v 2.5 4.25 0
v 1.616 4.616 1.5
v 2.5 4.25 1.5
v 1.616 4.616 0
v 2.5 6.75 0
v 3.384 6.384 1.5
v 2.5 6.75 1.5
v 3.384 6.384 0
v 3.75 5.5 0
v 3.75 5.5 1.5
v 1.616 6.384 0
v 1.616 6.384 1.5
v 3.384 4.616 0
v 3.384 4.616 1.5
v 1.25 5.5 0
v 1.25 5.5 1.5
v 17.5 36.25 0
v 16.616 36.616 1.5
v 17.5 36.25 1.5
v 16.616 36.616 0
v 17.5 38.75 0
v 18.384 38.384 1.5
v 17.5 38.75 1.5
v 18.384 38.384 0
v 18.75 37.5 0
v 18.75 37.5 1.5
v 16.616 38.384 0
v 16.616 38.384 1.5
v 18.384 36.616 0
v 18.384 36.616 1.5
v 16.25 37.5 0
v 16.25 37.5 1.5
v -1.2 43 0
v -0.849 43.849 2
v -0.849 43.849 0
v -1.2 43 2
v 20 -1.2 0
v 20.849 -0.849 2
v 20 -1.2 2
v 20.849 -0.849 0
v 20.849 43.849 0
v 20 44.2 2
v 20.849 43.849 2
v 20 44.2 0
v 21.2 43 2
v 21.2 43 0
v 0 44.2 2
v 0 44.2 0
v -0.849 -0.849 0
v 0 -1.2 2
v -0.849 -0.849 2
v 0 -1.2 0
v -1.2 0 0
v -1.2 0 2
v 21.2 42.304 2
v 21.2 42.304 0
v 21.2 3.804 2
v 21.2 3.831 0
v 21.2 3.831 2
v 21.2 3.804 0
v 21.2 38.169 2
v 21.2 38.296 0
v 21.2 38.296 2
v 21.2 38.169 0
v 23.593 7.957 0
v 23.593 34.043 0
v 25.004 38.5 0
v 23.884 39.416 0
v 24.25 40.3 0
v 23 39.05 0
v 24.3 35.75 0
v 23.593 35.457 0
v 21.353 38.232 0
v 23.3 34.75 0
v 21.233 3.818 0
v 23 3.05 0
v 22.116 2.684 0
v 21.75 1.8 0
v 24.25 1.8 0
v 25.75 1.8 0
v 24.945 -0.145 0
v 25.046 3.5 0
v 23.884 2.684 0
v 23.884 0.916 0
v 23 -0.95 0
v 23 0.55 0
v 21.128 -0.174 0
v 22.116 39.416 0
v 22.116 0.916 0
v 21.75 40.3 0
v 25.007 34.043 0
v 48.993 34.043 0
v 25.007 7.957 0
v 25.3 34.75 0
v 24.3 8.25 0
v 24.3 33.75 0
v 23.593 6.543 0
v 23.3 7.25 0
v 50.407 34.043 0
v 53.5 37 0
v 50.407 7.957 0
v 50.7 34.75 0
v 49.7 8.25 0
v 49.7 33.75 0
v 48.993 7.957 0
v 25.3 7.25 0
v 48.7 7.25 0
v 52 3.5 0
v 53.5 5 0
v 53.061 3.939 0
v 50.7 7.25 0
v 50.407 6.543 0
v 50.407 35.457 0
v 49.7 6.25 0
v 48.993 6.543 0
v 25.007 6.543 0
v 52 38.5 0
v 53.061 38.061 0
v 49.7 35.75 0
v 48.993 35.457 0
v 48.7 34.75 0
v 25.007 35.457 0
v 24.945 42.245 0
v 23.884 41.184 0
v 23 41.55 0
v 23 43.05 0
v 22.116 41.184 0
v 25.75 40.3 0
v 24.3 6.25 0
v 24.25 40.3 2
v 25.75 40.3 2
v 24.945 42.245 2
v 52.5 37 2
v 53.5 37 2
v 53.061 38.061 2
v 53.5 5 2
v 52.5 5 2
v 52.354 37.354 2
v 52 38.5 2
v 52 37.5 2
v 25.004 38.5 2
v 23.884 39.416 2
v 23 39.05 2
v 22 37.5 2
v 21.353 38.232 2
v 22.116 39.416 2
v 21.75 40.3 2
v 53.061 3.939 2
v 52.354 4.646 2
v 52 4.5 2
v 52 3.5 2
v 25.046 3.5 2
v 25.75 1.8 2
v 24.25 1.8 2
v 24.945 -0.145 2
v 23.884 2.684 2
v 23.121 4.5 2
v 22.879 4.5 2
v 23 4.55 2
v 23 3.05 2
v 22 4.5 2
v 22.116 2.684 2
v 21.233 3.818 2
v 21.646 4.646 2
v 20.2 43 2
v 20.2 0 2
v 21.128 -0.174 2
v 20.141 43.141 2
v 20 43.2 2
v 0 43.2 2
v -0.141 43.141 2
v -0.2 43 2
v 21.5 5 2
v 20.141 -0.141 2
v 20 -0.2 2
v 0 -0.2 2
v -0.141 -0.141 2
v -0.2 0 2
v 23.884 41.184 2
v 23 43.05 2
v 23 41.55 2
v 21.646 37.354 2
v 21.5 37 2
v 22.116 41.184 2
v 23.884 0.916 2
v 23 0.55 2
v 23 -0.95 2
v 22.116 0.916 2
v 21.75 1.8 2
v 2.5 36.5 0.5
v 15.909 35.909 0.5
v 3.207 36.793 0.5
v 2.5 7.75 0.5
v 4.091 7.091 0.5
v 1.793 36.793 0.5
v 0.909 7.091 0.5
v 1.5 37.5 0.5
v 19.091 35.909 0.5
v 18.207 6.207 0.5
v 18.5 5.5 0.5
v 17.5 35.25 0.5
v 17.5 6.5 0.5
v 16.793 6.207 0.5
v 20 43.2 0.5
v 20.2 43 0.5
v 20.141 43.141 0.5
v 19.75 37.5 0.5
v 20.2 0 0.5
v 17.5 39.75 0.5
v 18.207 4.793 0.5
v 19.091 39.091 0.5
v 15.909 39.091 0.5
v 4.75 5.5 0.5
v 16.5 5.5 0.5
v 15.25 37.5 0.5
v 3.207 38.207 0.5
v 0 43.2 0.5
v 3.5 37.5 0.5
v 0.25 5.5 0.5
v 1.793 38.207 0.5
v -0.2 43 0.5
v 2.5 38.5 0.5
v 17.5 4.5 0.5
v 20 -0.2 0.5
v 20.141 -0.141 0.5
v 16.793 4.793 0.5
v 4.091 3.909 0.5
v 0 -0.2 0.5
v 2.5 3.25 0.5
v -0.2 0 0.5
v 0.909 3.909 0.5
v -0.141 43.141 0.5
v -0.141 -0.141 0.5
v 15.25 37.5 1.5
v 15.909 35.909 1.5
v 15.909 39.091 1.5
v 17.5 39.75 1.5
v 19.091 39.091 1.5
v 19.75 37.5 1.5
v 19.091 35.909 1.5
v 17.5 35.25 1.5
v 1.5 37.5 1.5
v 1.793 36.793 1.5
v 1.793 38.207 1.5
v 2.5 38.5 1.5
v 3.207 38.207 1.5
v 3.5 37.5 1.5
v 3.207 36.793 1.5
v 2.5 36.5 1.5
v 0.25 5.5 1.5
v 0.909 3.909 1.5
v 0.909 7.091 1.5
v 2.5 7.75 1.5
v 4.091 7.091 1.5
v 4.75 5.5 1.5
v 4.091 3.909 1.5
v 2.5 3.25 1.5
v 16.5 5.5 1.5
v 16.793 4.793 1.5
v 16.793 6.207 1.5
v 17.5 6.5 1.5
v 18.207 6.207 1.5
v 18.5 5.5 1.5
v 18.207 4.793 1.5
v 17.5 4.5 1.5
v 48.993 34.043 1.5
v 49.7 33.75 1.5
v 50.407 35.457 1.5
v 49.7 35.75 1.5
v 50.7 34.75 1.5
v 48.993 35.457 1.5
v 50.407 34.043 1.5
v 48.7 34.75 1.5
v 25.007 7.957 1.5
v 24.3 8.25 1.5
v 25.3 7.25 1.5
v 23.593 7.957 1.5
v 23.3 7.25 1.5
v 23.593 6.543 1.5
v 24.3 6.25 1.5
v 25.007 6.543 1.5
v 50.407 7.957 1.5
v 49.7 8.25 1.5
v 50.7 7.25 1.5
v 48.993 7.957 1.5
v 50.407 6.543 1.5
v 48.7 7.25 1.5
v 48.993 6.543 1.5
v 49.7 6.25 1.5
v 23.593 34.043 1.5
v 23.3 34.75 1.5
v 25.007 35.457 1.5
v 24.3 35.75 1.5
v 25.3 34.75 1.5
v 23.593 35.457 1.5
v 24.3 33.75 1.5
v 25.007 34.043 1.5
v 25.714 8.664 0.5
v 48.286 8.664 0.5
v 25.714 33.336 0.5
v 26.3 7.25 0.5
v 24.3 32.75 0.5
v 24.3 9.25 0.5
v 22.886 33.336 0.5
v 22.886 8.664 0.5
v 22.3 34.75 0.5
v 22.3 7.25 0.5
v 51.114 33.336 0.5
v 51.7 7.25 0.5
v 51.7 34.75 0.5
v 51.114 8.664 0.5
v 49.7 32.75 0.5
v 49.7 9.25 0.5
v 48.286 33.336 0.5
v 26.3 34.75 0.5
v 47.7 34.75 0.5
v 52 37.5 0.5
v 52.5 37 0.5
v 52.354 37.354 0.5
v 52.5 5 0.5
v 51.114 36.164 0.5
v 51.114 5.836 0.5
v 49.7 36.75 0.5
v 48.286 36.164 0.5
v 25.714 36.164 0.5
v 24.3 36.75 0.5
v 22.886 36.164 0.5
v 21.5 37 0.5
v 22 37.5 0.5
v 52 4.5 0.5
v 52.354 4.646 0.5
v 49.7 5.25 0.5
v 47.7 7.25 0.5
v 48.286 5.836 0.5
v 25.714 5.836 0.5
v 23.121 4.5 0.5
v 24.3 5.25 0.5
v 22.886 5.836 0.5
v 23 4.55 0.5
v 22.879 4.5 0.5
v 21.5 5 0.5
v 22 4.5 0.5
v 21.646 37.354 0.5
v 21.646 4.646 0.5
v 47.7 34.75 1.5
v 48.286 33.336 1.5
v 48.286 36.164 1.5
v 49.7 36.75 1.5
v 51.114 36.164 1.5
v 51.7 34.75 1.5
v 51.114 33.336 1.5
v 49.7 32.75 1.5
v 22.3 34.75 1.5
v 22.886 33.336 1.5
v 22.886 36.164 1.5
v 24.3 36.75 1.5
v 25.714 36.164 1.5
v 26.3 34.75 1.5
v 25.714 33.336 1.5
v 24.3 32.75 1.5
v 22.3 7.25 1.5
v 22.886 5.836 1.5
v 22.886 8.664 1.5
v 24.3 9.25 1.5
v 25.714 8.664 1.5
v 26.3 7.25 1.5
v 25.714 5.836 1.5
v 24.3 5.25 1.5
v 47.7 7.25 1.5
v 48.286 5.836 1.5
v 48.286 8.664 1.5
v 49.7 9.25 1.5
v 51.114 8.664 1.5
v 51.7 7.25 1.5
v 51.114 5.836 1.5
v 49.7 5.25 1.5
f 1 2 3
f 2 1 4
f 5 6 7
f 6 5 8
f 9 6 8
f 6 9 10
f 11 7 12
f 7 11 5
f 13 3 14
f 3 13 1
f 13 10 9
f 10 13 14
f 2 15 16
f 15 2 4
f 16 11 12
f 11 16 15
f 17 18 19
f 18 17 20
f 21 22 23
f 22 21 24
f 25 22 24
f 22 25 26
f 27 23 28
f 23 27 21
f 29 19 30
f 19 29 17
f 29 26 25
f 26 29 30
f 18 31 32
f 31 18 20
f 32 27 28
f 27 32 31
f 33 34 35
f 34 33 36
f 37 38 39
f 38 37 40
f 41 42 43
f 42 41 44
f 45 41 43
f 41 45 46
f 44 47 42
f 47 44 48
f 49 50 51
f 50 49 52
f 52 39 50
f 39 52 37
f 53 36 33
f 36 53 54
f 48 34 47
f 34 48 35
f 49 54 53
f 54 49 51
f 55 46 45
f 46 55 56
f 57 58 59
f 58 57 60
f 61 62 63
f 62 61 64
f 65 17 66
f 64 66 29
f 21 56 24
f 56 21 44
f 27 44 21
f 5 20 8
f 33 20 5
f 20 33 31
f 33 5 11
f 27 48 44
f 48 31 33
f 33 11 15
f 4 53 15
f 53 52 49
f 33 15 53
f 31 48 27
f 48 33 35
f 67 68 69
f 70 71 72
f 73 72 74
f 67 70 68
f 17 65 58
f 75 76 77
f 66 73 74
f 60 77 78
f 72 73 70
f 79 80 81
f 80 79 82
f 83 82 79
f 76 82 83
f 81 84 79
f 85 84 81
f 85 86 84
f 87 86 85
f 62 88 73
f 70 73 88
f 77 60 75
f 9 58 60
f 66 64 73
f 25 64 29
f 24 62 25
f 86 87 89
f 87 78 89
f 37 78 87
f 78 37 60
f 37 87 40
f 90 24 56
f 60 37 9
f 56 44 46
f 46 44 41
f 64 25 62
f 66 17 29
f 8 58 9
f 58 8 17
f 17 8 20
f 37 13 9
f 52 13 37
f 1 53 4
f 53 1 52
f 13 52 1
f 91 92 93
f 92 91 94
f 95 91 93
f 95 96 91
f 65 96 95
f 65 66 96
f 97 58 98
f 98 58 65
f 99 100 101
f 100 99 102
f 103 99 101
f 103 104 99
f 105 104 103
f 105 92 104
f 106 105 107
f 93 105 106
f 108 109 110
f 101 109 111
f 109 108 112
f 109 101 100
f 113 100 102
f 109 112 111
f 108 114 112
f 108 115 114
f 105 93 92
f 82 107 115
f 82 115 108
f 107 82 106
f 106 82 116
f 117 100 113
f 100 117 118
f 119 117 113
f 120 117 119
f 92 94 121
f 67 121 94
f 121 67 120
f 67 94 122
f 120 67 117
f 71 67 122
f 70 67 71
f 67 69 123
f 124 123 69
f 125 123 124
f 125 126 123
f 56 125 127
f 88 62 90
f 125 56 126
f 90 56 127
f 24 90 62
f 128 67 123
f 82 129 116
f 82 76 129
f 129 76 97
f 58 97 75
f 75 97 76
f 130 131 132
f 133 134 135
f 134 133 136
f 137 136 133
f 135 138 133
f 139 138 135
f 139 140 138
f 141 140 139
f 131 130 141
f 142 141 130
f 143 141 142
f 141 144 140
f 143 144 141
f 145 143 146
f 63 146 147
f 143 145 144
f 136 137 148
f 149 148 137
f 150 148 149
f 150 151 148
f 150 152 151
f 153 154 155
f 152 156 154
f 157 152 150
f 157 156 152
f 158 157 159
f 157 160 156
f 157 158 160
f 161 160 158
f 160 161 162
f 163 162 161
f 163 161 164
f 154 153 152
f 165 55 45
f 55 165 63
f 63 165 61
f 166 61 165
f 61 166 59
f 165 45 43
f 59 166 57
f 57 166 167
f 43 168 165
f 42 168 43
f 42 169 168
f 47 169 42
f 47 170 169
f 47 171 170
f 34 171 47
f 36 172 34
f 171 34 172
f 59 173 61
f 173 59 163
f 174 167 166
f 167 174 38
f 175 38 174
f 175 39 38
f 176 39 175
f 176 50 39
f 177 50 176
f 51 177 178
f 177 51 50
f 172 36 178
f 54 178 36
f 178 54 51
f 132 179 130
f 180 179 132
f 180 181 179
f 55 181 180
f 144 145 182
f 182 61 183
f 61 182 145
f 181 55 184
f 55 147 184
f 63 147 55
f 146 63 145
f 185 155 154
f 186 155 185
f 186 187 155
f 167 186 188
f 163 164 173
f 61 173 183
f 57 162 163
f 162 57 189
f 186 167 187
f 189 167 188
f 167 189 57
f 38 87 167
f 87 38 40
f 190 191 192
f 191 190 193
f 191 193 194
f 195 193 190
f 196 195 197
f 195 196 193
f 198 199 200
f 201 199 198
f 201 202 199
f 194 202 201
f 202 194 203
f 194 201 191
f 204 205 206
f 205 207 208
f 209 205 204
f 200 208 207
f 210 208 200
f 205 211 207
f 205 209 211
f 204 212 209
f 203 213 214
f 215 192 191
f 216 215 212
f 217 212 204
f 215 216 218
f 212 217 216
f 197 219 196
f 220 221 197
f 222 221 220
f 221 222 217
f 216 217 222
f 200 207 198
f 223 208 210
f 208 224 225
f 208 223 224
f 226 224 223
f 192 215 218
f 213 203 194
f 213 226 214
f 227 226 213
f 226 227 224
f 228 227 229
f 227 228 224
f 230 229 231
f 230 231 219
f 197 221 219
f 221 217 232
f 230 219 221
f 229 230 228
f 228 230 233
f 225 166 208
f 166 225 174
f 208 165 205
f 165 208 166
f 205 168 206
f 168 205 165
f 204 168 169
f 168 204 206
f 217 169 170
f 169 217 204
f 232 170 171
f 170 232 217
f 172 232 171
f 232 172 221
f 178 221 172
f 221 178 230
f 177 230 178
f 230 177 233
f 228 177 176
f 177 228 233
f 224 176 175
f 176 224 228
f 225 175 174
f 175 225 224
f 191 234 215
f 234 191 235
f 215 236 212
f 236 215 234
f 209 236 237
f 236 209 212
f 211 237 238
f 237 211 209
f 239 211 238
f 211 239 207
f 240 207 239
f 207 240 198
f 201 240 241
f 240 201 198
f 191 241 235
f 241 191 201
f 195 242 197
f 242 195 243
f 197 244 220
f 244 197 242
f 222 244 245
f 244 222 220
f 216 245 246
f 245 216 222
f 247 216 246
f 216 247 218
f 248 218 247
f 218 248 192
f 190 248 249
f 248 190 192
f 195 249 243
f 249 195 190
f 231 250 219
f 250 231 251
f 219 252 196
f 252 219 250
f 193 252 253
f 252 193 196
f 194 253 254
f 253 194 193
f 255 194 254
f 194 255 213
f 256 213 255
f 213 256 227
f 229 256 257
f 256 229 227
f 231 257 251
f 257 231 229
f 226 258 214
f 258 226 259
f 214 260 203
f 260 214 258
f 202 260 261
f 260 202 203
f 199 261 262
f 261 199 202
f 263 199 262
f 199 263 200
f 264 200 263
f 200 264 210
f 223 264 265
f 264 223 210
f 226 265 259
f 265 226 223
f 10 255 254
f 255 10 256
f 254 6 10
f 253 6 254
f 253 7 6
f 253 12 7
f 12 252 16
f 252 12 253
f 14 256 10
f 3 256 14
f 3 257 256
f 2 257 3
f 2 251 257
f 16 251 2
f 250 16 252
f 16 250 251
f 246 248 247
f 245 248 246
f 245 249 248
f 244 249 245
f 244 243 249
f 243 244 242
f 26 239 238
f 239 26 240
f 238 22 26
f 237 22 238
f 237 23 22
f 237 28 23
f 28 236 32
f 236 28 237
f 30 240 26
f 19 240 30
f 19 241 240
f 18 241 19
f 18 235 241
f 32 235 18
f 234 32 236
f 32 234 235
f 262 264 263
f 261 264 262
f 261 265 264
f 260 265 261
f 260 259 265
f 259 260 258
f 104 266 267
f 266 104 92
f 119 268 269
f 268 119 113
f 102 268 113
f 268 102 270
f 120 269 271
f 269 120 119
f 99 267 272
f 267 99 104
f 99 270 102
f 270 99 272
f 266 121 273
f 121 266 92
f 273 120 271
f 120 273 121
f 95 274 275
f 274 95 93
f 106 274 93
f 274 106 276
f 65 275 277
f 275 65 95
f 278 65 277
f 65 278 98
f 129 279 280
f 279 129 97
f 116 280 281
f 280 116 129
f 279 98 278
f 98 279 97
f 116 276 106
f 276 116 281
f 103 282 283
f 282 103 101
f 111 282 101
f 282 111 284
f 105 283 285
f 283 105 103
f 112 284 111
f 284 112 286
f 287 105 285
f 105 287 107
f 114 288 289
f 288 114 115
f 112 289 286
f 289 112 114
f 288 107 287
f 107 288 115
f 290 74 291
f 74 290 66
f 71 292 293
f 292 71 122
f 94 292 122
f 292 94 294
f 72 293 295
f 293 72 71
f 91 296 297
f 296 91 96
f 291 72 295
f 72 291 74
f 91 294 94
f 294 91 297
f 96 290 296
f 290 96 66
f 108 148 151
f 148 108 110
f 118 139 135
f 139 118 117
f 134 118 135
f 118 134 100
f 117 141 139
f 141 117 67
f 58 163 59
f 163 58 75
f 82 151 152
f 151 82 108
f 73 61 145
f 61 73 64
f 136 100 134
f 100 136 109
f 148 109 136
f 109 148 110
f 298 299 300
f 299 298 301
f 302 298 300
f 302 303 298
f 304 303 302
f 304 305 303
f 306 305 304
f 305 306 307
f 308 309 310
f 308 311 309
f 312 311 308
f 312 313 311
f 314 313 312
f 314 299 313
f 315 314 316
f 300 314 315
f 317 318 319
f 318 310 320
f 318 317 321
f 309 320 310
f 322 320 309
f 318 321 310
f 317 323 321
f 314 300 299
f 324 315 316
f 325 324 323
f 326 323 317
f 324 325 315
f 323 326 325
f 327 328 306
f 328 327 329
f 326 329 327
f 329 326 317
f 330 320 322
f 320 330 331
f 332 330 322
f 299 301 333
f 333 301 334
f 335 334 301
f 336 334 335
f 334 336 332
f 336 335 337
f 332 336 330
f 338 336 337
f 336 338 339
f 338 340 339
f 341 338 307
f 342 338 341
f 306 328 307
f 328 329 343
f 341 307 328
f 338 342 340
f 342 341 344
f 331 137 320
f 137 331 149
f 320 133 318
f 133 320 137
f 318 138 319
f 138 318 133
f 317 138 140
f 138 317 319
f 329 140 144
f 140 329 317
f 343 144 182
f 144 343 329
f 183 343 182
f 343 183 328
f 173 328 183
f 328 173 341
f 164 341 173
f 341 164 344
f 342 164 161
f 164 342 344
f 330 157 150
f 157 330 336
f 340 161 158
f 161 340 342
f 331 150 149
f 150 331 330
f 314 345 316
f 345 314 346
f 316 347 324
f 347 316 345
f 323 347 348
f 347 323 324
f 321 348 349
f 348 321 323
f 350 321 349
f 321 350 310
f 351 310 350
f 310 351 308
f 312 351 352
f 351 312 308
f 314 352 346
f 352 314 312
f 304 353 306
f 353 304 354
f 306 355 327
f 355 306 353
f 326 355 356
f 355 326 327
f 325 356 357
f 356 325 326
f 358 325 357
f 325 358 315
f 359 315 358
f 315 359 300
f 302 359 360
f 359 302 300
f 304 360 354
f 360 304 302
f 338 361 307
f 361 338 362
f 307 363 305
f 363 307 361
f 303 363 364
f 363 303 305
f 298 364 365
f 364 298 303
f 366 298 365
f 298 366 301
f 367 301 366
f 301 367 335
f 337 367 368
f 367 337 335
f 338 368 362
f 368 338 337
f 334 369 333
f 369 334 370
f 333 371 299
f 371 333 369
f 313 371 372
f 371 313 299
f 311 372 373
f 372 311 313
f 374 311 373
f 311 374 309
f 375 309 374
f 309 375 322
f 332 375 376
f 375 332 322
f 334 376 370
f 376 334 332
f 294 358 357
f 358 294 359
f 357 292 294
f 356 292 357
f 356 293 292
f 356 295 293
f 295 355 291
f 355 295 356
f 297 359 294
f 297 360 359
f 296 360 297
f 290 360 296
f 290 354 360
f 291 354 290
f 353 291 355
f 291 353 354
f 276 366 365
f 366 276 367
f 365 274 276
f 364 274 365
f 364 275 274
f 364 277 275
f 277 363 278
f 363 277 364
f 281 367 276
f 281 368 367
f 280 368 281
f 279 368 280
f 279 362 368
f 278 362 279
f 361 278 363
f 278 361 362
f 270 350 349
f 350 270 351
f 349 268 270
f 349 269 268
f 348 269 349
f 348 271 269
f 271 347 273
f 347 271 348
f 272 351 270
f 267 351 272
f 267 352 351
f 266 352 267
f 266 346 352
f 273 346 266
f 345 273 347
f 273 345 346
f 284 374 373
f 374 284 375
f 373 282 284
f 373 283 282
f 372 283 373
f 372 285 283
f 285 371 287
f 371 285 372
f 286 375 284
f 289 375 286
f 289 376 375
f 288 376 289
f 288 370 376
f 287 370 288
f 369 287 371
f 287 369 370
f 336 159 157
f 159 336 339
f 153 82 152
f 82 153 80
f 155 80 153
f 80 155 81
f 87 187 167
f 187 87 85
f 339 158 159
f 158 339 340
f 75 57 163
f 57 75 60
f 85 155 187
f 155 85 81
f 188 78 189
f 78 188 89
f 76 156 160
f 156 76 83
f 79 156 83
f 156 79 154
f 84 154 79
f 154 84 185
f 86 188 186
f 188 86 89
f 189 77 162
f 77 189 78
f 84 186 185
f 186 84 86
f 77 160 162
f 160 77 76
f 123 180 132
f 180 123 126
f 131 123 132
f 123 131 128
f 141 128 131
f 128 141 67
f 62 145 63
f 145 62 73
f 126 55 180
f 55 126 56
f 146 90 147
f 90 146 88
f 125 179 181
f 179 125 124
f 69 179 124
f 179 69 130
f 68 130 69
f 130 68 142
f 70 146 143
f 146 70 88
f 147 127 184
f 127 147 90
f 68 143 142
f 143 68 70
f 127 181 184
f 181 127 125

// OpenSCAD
z=[0,0,1];
$fn=8;
module dcdc_mount() {
    size = [20,43];
    mountinghole = [2.5, 5.5];
    
    difference() {
        linear_extrude(2)
            offset(r=1.2)square(size);
        translate(z*0.5)
            linear_extrude(2)
                difference(){
                    offset(r=0.2)square(size); 
                        
                translate(mountinghole)
                    circle(d=4.5);
                translate(size-mountinghole)
                    circle(d=4.5);
                translate([mountinghole.x, size.y-mountinghole.y])
                    circle(d=2);
                translate([size.x-mountinghole.x, mountinghole.y])
                    circle(d=2);
                
            }
        translate(-z){
            translate(mountinghole)
                cylinder(d=2.5, h=4, $fn=8);
            translate(size-mountinghole)
                cylinder(d=2.5, h=4, $fn=8);
        }
        
        translate(z*1.5)
            linear_extrude(2)
                    offset(r=0.1)square(size); 
    }
    
}

module pwm_mount() {
    size= [30,32];
    
    mountingholes = [25.4, 27.5]/2;
    difference() {
        linear_extrude(2)
            offset(r=1.5)square(size, center=true);
        translate(z*0.5)
            linear_extrude(2)
                difference(){
                    offset(r=0.5)square(size, center=true); 
                        
                translate(mountingholes)
                    circle(d=4);
                translate(-mountingholes)
                    circle(d=4);
                translate([mountingholes.x, -mountingholes.y])
                    circle(d=4);
                translate([-mountingholes.x, mountingholes.y])
                    circle(d=4);
                
            }
        translate(-z){
            translate(mountingholes)
                cylinder(d=2, h=4);
            translate(-mountingholes)
                cylinder(d=2, h=4);
            
            translate([mountingholes.x, -mountingholes.y])
                cylinder(d=2, h=4);
            translate([-mountingholes.x, mountingholes.y])
                cylinder(d=2, h=4);
        }
        
        translate(z*1.5)
            linear_extrude(2)
                    offset(r=0.1)square(size, center=true); 
    }
}

dcdc_mount();
translate([37,21])
    pwm_mount();
translate([23,1.8]){
    difference(){
        cylinder(d=5.5, h=2);
        cylinder(d=2.5, h=8, center=true);
    }
}
translate([23,40.3]){
    difference(){
        cylinder(d=5.5, h=2);
        cylinder(d=2.5, h=8, center=true);
    }
}
